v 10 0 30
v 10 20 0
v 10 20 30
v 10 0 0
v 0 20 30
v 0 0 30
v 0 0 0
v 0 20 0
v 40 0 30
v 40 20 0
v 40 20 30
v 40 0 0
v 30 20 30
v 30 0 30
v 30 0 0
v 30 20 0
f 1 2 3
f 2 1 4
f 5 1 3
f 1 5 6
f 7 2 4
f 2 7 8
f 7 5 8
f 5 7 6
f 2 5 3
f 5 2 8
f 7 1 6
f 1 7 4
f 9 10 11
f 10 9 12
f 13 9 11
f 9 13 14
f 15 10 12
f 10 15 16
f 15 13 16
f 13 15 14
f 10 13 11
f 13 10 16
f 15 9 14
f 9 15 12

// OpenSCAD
translate([0, 0, 0]){
cube([10, 20, 30]);
}
translate([30, 0, 0]){
cube([10, 20, 30]);
}
